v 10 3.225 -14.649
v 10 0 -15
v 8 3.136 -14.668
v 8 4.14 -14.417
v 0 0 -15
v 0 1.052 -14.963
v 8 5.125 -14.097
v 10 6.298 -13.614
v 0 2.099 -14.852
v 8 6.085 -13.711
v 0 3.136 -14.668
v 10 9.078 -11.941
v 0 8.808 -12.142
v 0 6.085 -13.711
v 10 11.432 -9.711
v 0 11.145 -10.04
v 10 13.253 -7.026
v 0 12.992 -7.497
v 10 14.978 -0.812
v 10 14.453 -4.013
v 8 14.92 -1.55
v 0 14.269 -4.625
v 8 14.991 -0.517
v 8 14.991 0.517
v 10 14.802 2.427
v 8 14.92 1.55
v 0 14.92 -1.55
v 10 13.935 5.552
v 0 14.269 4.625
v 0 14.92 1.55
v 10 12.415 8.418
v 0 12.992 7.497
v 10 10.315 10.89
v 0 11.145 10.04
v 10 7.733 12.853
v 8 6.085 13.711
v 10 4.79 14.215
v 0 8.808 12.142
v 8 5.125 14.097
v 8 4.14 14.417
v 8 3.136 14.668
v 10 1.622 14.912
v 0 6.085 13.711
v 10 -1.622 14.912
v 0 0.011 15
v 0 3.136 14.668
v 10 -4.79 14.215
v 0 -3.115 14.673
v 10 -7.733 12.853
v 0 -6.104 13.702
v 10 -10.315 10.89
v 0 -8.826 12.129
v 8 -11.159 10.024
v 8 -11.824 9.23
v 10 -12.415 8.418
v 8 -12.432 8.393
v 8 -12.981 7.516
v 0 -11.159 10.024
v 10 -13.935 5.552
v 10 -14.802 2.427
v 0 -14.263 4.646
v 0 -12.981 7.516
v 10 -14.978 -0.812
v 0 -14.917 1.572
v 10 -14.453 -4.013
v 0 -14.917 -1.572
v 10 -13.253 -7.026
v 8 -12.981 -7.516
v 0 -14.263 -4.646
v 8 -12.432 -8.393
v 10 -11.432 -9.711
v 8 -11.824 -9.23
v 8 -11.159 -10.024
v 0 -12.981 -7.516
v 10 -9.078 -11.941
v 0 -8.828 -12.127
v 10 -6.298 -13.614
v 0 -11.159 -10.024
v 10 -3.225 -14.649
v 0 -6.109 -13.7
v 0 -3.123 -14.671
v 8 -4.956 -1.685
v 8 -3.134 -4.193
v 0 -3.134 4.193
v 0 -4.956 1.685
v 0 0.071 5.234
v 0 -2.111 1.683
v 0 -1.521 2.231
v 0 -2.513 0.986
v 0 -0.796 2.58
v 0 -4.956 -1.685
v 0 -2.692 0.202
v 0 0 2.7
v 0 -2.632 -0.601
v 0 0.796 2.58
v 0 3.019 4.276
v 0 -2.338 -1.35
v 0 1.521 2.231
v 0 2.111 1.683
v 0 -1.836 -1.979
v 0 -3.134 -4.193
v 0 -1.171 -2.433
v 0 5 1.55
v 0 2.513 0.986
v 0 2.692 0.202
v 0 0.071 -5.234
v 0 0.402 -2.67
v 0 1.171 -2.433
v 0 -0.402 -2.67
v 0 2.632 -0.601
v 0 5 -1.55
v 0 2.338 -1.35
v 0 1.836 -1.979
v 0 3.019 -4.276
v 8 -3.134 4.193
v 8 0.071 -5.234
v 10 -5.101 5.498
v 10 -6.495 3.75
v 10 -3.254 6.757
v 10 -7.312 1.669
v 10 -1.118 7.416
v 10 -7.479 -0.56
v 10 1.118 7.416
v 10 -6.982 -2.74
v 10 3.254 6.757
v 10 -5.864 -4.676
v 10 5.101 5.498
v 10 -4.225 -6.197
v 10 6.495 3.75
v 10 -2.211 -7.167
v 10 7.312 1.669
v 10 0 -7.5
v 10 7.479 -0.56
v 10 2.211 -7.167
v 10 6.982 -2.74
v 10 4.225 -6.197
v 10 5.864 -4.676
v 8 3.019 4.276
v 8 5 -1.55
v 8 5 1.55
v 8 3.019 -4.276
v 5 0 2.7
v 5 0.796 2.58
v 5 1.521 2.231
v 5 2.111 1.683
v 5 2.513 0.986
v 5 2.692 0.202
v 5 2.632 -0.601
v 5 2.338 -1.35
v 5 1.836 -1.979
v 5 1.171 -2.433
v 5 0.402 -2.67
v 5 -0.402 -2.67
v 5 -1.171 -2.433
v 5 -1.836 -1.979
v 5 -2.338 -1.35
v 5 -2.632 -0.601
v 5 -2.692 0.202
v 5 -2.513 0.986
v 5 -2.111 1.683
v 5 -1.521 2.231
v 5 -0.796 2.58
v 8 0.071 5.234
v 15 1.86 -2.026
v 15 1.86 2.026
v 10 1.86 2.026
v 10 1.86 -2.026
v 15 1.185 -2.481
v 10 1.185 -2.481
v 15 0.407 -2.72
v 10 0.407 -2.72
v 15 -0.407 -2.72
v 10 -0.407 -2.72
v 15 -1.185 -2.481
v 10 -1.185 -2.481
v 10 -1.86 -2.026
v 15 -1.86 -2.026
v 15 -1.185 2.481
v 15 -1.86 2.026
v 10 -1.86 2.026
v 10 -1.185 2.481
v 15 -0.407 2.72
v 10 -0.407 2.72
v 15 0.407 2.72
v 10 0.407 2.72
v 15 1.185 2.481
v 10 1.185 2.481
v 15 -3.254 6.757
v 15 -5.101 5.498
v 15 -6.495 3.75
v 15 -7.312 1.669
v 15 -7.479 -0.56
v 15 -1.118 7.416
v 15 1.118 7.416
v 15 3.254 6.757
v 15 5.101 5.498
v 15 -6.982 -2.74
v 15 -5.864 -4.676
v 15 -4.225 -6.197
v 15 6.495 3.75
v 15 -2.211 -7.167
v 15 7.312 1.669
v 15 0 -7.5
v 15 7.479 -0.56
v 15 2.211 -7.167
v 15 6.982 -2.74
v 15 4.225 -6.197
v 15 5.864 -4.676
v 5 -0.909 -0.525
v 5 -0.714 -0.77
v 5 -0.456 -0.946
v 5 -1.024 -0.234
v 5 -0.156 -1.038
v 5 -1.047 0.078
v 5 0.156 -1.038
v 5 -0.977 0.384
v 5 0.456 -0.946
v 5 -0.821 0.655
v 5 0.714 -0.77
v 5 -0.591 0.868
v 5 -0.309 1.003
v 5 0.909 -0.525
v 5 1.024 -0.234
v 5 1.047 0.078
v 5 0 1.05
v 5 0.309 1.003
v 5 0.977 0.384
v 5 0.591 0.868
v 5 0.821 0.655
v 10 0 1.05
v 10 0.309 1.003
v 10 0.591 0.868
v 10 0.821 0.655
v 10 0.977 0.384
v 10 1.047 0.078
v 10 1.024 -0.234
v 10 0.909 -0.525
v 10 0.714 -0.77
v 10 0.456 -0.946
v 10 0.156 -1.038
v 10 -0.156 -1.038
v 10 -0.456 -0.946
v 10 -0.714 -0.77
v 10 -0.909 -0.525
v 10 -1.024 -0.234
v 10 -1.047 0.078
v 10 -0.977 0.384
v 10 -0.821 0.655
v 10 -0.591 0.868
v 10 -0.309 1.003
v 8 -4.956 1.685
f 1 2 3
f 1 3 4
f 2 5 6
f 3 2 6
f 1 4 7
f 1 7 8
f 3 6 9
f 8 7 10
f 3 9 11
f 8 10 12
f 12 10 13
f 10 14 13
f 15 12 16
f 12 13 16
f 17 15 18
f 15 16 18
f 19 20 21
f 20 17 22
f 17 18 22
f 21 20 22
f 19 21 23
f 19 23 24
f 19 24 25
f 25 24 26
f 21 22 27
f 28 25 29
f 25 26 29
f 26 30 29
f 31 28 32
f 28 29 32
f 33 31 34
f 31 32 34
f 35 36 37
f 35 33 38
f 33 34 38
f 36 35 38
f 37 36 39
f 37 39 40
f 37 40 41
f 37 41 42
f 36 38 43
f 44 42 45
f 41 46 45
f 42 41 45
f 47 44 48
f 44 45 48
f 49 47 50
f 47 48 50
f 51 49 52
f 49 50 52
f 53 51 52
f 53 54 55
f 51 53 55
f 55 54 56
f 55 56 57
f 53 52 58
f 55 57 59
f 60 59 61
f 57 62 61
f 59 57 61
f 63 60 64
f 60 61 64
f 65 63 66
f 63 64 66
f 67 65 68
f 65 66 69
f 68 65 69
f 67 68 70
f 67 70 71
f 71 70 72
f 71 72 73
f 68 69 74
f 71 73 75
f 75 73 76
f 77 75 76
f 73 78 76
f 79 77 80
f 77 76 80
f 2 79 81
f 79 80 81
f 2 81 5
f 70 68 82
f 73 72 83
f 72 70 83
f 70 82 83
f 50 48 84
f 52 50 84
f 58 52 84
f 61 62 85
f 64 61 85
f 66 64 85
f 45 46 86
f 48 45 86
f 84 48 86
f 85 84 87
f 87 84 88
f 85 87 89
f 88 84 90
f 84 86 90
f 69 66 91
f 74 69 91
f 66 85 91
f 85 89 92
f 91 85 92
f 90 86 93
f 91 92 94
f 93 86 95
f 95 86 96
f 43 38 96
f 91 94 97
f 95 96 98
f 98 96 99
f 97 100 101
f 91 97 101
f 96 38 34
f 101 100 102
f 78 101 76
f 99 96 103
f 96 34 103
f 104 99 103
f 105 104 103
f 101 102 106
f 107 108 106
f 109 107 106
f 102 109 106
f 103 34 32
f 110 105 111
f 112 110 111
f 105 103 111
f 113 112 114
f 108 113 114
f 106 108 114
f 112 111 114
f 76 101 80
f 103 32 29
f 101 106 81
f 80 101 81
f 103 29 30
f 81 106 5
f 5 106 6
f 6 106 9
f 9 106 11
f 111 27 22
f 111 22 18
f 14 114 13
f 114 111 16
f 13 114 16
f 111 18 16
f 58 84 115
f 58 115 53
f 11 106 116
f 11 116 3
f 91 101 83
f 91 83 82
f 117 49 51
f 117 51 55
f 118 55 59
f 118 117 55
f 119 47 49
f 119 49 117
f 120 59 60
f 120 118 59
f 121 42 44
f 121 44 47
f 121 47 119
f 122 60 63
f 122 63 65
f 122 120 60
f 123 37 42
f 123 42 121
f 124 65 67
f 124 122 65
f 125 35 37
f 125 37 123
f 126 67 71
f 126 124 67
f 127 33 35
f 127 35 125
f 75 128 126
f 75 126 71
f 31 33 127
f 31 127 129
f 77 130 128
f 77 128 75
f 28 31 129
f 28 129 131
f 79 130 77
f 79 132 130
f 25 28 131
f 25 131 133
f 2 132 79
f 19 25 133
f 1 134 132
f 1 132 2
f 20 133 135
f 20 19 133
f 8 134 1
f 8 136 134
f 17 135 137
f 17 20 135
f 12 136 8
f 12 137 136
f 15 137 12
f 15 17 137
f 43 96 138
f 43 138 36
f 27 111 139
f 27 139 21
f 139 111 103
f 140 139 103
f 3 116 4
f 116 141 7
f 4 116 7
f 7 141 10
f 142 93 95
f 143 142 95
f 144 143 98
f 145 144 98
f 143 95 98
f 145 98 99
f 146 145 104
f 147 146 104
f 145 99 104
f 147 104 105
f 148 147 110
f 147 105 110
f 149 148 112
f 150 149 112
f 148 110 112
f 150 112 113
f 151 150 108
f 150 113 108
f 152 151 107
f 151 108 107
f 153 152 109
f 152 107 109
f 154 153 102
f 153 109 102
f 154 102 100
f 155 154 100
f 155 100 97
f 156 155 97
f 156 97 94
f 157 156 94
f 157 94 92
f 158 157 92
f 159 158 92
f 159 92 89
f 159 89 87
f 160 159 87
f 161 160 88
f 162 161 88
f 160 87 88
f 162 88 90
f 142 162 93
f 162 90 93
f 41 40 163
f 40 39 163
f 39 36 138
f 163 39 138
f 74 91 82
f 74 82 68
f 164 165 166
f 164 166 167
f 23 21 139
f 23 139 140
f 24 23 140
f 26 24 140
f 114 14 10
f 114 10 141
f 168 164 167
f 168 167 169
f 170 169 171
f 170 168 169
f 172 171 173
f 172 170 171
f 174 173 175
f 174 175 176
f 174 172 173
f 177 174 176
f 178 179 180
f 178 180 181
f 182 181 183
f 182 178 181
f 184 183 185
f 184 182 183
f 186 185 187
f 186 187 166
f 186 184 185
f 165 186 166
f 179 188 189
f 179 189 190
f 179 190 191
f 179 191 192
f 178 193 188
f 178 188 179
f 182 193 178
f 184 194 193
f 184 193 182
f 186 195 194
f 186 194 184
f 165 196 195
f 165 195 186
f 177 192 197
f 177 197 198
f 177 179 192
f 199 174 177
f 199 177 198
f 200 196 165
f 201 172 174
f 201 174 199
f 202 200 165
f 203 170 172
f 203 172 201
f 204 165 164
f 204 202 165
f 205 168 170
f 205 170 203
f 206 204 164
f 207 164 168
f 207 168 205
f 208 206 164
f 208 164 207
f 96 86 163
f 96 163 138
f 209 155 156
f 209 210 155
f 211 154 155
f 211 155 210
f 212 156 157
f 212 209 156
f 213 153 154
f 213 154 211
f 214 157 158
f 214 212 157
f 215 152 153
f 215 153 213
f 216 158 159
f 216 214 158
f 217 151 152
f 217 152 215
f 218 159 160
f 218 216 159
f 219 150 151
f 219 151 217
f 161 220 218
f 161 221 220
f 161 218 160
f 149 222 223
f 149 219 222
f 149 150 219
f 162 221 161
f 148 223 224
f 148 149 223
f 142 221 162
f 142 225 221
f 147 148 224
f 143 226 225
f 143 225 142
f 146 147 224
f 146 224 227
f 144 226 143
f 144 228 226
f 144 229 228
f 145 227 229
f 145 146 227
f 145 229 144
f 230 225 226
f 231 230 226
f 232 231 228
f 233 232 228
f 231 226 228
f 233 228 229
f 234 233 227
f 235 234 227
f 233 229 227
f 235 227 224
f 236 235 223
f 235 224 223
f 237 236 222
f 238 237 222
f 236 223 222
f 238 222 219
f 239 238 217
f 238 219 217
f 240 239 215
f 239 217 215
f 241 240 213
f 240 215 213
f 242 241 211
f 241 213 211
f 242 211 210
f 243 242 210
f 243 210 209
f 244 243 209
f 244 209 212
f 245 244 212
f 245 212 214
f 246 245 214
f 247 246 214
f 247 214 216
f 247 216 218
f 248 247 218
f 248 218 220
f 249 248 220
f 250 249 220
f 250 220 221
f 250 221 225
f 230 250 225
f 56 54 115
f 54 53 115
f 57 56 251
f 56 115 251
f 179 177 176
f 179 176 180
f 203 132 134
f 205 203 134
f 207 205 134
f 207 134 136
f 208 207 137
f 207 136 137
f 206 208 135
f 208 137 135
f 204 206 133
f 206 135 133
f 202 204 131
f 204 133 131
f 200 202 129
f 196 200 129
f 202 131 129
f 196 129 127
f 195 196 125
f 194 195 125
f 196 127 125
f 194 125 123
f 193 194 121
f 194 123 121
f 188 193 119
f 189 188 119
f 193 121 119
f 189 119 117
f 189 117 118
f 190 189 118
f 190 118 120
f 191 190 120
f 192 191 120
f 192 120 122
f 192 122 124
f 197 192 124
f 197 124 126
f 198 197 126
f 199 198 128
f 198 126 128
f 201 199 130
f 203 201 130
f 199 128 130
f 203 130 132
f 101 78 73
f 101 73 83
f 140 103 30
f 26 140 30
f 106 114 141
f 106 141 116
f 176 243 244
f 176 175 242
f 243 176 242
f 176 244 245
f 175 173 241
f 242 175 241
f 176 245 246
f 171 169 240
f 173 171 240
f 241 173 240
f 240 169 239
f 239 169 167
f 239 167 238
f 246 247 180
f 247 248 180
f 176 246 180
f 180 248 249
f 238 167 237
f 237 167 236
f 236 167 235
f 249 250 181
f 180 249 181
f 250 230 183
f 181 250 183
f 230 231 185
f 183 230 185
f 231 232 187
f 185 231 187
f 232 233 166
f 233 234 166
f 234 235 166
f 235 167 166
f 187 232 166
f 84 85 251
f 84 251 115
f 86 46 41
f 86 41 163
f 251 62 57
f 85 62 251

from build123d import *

# Parameters (mm, degrees)
SKETCH_1_R          = 15
EXTRUDE_1_DEPTH     = 10
SKETCH_2_R          = 7.5
EXTRUDE_2_DEPTH     = 5
CUT_EXTRUDE_1_DEPTH = 5
SKETCH_4_R          = 2.7
CUT_EXTRUDE_2_DEPTH = 5
SKETCH_5_R          = 1.05
CUT_EXTRUDE_3_DEPTH = 24.452078799
SKETCH_6_W          = 3.1
SKETCH_6_H          = 14.99101371
CUT_EXTRUDE_4_DEPTH = 8


with BuildPart() as part:
    # 草图1 → 凸台-拉伸1 (new body)
    with BuildSketch(Plane(origin=(0, 0, 0), x_dir=(0, 0, -1), z_dir=(1, 0, 0))):
        Circle(SKETCH_1_R)
    extrude(amount=EXTRUDE_1_DEPTH)

    # 草图2 → 凸台-拉伸2 (add)
    with BuildSketch(Plane(origin=(10, 0, 0), x_dir=(0, 0, -1), z_dir=(1, 0, 0))):
        Circle(SKETCH_2_R)
    extrude(amount=EXTRUDE_2_DEPTH)

    # 草图3 → 切除-拉伸1 (cut)
    with BuildSketch(Plane(origin=(15, 0, 0), x_dir=(0, 0, -1), z_dir=(1, 0, 0))):
        with BuildLine():
            Line((-2.025561651, 1.86), (2.025561651, 1.86))
            ThreePointArc((2.025561651, 1.86), (2.75, 0), (2.025561651, -1.86))
            Line((2.025561651, -1.86), (-2.025561651, -1.86))
            ThreePointArc((-2.025561651, -1.86), (-2.75, 0), (-2.025561651, 1.86))
        make_face()
    extrude(amount=-CUT_EXTRUDE_1_DEPTH, mode=Mode.SUBTRACT)

    # 草图4 → 切除-拉伸2 (cut)
    with BuildSketch(Plane.ZY):
        Circle(SKETCH_4_R)
    extrude(amount=-CUT_EXTRUDE_2_DEPTH, mode=Mode.SUBTRACT)

    # 草图5 → 切除-拉伸3 (cut, through all)
    with BuildSketch(Plane.ZY.offset(-5)):
        Circle(SKETCH_5_R)
    extrude(amount=-CUT_EXTRUDE_3_DEPTH, mode=Mode.SUBTRACT)

    # 草图6 → 切除-拉伸4 (cut)
    with BuildSketch(Plane.ZY):
        Polygon((18.533607515, 7.651700572), (19.491560198, 4.703425371), (5.234258923, 0.070947372), (4.27630624, 3.019222572), align=None)
        with Locations((0, 12.495506855)):
            Rectangle(SKETCH_6_W, SKETCH_6_H)
        Polygon((13.004399379, -15.262002685), (10.496446696, -17.084136968), (1.68494992, -4.956152113), (4.192902603, -3.134017831), align=None)
        Polygon((-10.496446696, -17.084136968), (-13.004399379, -15.262002685), (-4.192902603, -3.134017831), (-1.68494992, -4.956152113), align=None)
        Polygon((-19.491560198, 4.703425371), (-18.533607515, 7.651700572), (-4.27630624, 3.019222572), (-5.234258923, 0.070947372), align=None)
    extrude(amount=-CUT_EXTRUDE_4_DEPTH, mode=Mode.SUBTRACT)


solid = part.part
